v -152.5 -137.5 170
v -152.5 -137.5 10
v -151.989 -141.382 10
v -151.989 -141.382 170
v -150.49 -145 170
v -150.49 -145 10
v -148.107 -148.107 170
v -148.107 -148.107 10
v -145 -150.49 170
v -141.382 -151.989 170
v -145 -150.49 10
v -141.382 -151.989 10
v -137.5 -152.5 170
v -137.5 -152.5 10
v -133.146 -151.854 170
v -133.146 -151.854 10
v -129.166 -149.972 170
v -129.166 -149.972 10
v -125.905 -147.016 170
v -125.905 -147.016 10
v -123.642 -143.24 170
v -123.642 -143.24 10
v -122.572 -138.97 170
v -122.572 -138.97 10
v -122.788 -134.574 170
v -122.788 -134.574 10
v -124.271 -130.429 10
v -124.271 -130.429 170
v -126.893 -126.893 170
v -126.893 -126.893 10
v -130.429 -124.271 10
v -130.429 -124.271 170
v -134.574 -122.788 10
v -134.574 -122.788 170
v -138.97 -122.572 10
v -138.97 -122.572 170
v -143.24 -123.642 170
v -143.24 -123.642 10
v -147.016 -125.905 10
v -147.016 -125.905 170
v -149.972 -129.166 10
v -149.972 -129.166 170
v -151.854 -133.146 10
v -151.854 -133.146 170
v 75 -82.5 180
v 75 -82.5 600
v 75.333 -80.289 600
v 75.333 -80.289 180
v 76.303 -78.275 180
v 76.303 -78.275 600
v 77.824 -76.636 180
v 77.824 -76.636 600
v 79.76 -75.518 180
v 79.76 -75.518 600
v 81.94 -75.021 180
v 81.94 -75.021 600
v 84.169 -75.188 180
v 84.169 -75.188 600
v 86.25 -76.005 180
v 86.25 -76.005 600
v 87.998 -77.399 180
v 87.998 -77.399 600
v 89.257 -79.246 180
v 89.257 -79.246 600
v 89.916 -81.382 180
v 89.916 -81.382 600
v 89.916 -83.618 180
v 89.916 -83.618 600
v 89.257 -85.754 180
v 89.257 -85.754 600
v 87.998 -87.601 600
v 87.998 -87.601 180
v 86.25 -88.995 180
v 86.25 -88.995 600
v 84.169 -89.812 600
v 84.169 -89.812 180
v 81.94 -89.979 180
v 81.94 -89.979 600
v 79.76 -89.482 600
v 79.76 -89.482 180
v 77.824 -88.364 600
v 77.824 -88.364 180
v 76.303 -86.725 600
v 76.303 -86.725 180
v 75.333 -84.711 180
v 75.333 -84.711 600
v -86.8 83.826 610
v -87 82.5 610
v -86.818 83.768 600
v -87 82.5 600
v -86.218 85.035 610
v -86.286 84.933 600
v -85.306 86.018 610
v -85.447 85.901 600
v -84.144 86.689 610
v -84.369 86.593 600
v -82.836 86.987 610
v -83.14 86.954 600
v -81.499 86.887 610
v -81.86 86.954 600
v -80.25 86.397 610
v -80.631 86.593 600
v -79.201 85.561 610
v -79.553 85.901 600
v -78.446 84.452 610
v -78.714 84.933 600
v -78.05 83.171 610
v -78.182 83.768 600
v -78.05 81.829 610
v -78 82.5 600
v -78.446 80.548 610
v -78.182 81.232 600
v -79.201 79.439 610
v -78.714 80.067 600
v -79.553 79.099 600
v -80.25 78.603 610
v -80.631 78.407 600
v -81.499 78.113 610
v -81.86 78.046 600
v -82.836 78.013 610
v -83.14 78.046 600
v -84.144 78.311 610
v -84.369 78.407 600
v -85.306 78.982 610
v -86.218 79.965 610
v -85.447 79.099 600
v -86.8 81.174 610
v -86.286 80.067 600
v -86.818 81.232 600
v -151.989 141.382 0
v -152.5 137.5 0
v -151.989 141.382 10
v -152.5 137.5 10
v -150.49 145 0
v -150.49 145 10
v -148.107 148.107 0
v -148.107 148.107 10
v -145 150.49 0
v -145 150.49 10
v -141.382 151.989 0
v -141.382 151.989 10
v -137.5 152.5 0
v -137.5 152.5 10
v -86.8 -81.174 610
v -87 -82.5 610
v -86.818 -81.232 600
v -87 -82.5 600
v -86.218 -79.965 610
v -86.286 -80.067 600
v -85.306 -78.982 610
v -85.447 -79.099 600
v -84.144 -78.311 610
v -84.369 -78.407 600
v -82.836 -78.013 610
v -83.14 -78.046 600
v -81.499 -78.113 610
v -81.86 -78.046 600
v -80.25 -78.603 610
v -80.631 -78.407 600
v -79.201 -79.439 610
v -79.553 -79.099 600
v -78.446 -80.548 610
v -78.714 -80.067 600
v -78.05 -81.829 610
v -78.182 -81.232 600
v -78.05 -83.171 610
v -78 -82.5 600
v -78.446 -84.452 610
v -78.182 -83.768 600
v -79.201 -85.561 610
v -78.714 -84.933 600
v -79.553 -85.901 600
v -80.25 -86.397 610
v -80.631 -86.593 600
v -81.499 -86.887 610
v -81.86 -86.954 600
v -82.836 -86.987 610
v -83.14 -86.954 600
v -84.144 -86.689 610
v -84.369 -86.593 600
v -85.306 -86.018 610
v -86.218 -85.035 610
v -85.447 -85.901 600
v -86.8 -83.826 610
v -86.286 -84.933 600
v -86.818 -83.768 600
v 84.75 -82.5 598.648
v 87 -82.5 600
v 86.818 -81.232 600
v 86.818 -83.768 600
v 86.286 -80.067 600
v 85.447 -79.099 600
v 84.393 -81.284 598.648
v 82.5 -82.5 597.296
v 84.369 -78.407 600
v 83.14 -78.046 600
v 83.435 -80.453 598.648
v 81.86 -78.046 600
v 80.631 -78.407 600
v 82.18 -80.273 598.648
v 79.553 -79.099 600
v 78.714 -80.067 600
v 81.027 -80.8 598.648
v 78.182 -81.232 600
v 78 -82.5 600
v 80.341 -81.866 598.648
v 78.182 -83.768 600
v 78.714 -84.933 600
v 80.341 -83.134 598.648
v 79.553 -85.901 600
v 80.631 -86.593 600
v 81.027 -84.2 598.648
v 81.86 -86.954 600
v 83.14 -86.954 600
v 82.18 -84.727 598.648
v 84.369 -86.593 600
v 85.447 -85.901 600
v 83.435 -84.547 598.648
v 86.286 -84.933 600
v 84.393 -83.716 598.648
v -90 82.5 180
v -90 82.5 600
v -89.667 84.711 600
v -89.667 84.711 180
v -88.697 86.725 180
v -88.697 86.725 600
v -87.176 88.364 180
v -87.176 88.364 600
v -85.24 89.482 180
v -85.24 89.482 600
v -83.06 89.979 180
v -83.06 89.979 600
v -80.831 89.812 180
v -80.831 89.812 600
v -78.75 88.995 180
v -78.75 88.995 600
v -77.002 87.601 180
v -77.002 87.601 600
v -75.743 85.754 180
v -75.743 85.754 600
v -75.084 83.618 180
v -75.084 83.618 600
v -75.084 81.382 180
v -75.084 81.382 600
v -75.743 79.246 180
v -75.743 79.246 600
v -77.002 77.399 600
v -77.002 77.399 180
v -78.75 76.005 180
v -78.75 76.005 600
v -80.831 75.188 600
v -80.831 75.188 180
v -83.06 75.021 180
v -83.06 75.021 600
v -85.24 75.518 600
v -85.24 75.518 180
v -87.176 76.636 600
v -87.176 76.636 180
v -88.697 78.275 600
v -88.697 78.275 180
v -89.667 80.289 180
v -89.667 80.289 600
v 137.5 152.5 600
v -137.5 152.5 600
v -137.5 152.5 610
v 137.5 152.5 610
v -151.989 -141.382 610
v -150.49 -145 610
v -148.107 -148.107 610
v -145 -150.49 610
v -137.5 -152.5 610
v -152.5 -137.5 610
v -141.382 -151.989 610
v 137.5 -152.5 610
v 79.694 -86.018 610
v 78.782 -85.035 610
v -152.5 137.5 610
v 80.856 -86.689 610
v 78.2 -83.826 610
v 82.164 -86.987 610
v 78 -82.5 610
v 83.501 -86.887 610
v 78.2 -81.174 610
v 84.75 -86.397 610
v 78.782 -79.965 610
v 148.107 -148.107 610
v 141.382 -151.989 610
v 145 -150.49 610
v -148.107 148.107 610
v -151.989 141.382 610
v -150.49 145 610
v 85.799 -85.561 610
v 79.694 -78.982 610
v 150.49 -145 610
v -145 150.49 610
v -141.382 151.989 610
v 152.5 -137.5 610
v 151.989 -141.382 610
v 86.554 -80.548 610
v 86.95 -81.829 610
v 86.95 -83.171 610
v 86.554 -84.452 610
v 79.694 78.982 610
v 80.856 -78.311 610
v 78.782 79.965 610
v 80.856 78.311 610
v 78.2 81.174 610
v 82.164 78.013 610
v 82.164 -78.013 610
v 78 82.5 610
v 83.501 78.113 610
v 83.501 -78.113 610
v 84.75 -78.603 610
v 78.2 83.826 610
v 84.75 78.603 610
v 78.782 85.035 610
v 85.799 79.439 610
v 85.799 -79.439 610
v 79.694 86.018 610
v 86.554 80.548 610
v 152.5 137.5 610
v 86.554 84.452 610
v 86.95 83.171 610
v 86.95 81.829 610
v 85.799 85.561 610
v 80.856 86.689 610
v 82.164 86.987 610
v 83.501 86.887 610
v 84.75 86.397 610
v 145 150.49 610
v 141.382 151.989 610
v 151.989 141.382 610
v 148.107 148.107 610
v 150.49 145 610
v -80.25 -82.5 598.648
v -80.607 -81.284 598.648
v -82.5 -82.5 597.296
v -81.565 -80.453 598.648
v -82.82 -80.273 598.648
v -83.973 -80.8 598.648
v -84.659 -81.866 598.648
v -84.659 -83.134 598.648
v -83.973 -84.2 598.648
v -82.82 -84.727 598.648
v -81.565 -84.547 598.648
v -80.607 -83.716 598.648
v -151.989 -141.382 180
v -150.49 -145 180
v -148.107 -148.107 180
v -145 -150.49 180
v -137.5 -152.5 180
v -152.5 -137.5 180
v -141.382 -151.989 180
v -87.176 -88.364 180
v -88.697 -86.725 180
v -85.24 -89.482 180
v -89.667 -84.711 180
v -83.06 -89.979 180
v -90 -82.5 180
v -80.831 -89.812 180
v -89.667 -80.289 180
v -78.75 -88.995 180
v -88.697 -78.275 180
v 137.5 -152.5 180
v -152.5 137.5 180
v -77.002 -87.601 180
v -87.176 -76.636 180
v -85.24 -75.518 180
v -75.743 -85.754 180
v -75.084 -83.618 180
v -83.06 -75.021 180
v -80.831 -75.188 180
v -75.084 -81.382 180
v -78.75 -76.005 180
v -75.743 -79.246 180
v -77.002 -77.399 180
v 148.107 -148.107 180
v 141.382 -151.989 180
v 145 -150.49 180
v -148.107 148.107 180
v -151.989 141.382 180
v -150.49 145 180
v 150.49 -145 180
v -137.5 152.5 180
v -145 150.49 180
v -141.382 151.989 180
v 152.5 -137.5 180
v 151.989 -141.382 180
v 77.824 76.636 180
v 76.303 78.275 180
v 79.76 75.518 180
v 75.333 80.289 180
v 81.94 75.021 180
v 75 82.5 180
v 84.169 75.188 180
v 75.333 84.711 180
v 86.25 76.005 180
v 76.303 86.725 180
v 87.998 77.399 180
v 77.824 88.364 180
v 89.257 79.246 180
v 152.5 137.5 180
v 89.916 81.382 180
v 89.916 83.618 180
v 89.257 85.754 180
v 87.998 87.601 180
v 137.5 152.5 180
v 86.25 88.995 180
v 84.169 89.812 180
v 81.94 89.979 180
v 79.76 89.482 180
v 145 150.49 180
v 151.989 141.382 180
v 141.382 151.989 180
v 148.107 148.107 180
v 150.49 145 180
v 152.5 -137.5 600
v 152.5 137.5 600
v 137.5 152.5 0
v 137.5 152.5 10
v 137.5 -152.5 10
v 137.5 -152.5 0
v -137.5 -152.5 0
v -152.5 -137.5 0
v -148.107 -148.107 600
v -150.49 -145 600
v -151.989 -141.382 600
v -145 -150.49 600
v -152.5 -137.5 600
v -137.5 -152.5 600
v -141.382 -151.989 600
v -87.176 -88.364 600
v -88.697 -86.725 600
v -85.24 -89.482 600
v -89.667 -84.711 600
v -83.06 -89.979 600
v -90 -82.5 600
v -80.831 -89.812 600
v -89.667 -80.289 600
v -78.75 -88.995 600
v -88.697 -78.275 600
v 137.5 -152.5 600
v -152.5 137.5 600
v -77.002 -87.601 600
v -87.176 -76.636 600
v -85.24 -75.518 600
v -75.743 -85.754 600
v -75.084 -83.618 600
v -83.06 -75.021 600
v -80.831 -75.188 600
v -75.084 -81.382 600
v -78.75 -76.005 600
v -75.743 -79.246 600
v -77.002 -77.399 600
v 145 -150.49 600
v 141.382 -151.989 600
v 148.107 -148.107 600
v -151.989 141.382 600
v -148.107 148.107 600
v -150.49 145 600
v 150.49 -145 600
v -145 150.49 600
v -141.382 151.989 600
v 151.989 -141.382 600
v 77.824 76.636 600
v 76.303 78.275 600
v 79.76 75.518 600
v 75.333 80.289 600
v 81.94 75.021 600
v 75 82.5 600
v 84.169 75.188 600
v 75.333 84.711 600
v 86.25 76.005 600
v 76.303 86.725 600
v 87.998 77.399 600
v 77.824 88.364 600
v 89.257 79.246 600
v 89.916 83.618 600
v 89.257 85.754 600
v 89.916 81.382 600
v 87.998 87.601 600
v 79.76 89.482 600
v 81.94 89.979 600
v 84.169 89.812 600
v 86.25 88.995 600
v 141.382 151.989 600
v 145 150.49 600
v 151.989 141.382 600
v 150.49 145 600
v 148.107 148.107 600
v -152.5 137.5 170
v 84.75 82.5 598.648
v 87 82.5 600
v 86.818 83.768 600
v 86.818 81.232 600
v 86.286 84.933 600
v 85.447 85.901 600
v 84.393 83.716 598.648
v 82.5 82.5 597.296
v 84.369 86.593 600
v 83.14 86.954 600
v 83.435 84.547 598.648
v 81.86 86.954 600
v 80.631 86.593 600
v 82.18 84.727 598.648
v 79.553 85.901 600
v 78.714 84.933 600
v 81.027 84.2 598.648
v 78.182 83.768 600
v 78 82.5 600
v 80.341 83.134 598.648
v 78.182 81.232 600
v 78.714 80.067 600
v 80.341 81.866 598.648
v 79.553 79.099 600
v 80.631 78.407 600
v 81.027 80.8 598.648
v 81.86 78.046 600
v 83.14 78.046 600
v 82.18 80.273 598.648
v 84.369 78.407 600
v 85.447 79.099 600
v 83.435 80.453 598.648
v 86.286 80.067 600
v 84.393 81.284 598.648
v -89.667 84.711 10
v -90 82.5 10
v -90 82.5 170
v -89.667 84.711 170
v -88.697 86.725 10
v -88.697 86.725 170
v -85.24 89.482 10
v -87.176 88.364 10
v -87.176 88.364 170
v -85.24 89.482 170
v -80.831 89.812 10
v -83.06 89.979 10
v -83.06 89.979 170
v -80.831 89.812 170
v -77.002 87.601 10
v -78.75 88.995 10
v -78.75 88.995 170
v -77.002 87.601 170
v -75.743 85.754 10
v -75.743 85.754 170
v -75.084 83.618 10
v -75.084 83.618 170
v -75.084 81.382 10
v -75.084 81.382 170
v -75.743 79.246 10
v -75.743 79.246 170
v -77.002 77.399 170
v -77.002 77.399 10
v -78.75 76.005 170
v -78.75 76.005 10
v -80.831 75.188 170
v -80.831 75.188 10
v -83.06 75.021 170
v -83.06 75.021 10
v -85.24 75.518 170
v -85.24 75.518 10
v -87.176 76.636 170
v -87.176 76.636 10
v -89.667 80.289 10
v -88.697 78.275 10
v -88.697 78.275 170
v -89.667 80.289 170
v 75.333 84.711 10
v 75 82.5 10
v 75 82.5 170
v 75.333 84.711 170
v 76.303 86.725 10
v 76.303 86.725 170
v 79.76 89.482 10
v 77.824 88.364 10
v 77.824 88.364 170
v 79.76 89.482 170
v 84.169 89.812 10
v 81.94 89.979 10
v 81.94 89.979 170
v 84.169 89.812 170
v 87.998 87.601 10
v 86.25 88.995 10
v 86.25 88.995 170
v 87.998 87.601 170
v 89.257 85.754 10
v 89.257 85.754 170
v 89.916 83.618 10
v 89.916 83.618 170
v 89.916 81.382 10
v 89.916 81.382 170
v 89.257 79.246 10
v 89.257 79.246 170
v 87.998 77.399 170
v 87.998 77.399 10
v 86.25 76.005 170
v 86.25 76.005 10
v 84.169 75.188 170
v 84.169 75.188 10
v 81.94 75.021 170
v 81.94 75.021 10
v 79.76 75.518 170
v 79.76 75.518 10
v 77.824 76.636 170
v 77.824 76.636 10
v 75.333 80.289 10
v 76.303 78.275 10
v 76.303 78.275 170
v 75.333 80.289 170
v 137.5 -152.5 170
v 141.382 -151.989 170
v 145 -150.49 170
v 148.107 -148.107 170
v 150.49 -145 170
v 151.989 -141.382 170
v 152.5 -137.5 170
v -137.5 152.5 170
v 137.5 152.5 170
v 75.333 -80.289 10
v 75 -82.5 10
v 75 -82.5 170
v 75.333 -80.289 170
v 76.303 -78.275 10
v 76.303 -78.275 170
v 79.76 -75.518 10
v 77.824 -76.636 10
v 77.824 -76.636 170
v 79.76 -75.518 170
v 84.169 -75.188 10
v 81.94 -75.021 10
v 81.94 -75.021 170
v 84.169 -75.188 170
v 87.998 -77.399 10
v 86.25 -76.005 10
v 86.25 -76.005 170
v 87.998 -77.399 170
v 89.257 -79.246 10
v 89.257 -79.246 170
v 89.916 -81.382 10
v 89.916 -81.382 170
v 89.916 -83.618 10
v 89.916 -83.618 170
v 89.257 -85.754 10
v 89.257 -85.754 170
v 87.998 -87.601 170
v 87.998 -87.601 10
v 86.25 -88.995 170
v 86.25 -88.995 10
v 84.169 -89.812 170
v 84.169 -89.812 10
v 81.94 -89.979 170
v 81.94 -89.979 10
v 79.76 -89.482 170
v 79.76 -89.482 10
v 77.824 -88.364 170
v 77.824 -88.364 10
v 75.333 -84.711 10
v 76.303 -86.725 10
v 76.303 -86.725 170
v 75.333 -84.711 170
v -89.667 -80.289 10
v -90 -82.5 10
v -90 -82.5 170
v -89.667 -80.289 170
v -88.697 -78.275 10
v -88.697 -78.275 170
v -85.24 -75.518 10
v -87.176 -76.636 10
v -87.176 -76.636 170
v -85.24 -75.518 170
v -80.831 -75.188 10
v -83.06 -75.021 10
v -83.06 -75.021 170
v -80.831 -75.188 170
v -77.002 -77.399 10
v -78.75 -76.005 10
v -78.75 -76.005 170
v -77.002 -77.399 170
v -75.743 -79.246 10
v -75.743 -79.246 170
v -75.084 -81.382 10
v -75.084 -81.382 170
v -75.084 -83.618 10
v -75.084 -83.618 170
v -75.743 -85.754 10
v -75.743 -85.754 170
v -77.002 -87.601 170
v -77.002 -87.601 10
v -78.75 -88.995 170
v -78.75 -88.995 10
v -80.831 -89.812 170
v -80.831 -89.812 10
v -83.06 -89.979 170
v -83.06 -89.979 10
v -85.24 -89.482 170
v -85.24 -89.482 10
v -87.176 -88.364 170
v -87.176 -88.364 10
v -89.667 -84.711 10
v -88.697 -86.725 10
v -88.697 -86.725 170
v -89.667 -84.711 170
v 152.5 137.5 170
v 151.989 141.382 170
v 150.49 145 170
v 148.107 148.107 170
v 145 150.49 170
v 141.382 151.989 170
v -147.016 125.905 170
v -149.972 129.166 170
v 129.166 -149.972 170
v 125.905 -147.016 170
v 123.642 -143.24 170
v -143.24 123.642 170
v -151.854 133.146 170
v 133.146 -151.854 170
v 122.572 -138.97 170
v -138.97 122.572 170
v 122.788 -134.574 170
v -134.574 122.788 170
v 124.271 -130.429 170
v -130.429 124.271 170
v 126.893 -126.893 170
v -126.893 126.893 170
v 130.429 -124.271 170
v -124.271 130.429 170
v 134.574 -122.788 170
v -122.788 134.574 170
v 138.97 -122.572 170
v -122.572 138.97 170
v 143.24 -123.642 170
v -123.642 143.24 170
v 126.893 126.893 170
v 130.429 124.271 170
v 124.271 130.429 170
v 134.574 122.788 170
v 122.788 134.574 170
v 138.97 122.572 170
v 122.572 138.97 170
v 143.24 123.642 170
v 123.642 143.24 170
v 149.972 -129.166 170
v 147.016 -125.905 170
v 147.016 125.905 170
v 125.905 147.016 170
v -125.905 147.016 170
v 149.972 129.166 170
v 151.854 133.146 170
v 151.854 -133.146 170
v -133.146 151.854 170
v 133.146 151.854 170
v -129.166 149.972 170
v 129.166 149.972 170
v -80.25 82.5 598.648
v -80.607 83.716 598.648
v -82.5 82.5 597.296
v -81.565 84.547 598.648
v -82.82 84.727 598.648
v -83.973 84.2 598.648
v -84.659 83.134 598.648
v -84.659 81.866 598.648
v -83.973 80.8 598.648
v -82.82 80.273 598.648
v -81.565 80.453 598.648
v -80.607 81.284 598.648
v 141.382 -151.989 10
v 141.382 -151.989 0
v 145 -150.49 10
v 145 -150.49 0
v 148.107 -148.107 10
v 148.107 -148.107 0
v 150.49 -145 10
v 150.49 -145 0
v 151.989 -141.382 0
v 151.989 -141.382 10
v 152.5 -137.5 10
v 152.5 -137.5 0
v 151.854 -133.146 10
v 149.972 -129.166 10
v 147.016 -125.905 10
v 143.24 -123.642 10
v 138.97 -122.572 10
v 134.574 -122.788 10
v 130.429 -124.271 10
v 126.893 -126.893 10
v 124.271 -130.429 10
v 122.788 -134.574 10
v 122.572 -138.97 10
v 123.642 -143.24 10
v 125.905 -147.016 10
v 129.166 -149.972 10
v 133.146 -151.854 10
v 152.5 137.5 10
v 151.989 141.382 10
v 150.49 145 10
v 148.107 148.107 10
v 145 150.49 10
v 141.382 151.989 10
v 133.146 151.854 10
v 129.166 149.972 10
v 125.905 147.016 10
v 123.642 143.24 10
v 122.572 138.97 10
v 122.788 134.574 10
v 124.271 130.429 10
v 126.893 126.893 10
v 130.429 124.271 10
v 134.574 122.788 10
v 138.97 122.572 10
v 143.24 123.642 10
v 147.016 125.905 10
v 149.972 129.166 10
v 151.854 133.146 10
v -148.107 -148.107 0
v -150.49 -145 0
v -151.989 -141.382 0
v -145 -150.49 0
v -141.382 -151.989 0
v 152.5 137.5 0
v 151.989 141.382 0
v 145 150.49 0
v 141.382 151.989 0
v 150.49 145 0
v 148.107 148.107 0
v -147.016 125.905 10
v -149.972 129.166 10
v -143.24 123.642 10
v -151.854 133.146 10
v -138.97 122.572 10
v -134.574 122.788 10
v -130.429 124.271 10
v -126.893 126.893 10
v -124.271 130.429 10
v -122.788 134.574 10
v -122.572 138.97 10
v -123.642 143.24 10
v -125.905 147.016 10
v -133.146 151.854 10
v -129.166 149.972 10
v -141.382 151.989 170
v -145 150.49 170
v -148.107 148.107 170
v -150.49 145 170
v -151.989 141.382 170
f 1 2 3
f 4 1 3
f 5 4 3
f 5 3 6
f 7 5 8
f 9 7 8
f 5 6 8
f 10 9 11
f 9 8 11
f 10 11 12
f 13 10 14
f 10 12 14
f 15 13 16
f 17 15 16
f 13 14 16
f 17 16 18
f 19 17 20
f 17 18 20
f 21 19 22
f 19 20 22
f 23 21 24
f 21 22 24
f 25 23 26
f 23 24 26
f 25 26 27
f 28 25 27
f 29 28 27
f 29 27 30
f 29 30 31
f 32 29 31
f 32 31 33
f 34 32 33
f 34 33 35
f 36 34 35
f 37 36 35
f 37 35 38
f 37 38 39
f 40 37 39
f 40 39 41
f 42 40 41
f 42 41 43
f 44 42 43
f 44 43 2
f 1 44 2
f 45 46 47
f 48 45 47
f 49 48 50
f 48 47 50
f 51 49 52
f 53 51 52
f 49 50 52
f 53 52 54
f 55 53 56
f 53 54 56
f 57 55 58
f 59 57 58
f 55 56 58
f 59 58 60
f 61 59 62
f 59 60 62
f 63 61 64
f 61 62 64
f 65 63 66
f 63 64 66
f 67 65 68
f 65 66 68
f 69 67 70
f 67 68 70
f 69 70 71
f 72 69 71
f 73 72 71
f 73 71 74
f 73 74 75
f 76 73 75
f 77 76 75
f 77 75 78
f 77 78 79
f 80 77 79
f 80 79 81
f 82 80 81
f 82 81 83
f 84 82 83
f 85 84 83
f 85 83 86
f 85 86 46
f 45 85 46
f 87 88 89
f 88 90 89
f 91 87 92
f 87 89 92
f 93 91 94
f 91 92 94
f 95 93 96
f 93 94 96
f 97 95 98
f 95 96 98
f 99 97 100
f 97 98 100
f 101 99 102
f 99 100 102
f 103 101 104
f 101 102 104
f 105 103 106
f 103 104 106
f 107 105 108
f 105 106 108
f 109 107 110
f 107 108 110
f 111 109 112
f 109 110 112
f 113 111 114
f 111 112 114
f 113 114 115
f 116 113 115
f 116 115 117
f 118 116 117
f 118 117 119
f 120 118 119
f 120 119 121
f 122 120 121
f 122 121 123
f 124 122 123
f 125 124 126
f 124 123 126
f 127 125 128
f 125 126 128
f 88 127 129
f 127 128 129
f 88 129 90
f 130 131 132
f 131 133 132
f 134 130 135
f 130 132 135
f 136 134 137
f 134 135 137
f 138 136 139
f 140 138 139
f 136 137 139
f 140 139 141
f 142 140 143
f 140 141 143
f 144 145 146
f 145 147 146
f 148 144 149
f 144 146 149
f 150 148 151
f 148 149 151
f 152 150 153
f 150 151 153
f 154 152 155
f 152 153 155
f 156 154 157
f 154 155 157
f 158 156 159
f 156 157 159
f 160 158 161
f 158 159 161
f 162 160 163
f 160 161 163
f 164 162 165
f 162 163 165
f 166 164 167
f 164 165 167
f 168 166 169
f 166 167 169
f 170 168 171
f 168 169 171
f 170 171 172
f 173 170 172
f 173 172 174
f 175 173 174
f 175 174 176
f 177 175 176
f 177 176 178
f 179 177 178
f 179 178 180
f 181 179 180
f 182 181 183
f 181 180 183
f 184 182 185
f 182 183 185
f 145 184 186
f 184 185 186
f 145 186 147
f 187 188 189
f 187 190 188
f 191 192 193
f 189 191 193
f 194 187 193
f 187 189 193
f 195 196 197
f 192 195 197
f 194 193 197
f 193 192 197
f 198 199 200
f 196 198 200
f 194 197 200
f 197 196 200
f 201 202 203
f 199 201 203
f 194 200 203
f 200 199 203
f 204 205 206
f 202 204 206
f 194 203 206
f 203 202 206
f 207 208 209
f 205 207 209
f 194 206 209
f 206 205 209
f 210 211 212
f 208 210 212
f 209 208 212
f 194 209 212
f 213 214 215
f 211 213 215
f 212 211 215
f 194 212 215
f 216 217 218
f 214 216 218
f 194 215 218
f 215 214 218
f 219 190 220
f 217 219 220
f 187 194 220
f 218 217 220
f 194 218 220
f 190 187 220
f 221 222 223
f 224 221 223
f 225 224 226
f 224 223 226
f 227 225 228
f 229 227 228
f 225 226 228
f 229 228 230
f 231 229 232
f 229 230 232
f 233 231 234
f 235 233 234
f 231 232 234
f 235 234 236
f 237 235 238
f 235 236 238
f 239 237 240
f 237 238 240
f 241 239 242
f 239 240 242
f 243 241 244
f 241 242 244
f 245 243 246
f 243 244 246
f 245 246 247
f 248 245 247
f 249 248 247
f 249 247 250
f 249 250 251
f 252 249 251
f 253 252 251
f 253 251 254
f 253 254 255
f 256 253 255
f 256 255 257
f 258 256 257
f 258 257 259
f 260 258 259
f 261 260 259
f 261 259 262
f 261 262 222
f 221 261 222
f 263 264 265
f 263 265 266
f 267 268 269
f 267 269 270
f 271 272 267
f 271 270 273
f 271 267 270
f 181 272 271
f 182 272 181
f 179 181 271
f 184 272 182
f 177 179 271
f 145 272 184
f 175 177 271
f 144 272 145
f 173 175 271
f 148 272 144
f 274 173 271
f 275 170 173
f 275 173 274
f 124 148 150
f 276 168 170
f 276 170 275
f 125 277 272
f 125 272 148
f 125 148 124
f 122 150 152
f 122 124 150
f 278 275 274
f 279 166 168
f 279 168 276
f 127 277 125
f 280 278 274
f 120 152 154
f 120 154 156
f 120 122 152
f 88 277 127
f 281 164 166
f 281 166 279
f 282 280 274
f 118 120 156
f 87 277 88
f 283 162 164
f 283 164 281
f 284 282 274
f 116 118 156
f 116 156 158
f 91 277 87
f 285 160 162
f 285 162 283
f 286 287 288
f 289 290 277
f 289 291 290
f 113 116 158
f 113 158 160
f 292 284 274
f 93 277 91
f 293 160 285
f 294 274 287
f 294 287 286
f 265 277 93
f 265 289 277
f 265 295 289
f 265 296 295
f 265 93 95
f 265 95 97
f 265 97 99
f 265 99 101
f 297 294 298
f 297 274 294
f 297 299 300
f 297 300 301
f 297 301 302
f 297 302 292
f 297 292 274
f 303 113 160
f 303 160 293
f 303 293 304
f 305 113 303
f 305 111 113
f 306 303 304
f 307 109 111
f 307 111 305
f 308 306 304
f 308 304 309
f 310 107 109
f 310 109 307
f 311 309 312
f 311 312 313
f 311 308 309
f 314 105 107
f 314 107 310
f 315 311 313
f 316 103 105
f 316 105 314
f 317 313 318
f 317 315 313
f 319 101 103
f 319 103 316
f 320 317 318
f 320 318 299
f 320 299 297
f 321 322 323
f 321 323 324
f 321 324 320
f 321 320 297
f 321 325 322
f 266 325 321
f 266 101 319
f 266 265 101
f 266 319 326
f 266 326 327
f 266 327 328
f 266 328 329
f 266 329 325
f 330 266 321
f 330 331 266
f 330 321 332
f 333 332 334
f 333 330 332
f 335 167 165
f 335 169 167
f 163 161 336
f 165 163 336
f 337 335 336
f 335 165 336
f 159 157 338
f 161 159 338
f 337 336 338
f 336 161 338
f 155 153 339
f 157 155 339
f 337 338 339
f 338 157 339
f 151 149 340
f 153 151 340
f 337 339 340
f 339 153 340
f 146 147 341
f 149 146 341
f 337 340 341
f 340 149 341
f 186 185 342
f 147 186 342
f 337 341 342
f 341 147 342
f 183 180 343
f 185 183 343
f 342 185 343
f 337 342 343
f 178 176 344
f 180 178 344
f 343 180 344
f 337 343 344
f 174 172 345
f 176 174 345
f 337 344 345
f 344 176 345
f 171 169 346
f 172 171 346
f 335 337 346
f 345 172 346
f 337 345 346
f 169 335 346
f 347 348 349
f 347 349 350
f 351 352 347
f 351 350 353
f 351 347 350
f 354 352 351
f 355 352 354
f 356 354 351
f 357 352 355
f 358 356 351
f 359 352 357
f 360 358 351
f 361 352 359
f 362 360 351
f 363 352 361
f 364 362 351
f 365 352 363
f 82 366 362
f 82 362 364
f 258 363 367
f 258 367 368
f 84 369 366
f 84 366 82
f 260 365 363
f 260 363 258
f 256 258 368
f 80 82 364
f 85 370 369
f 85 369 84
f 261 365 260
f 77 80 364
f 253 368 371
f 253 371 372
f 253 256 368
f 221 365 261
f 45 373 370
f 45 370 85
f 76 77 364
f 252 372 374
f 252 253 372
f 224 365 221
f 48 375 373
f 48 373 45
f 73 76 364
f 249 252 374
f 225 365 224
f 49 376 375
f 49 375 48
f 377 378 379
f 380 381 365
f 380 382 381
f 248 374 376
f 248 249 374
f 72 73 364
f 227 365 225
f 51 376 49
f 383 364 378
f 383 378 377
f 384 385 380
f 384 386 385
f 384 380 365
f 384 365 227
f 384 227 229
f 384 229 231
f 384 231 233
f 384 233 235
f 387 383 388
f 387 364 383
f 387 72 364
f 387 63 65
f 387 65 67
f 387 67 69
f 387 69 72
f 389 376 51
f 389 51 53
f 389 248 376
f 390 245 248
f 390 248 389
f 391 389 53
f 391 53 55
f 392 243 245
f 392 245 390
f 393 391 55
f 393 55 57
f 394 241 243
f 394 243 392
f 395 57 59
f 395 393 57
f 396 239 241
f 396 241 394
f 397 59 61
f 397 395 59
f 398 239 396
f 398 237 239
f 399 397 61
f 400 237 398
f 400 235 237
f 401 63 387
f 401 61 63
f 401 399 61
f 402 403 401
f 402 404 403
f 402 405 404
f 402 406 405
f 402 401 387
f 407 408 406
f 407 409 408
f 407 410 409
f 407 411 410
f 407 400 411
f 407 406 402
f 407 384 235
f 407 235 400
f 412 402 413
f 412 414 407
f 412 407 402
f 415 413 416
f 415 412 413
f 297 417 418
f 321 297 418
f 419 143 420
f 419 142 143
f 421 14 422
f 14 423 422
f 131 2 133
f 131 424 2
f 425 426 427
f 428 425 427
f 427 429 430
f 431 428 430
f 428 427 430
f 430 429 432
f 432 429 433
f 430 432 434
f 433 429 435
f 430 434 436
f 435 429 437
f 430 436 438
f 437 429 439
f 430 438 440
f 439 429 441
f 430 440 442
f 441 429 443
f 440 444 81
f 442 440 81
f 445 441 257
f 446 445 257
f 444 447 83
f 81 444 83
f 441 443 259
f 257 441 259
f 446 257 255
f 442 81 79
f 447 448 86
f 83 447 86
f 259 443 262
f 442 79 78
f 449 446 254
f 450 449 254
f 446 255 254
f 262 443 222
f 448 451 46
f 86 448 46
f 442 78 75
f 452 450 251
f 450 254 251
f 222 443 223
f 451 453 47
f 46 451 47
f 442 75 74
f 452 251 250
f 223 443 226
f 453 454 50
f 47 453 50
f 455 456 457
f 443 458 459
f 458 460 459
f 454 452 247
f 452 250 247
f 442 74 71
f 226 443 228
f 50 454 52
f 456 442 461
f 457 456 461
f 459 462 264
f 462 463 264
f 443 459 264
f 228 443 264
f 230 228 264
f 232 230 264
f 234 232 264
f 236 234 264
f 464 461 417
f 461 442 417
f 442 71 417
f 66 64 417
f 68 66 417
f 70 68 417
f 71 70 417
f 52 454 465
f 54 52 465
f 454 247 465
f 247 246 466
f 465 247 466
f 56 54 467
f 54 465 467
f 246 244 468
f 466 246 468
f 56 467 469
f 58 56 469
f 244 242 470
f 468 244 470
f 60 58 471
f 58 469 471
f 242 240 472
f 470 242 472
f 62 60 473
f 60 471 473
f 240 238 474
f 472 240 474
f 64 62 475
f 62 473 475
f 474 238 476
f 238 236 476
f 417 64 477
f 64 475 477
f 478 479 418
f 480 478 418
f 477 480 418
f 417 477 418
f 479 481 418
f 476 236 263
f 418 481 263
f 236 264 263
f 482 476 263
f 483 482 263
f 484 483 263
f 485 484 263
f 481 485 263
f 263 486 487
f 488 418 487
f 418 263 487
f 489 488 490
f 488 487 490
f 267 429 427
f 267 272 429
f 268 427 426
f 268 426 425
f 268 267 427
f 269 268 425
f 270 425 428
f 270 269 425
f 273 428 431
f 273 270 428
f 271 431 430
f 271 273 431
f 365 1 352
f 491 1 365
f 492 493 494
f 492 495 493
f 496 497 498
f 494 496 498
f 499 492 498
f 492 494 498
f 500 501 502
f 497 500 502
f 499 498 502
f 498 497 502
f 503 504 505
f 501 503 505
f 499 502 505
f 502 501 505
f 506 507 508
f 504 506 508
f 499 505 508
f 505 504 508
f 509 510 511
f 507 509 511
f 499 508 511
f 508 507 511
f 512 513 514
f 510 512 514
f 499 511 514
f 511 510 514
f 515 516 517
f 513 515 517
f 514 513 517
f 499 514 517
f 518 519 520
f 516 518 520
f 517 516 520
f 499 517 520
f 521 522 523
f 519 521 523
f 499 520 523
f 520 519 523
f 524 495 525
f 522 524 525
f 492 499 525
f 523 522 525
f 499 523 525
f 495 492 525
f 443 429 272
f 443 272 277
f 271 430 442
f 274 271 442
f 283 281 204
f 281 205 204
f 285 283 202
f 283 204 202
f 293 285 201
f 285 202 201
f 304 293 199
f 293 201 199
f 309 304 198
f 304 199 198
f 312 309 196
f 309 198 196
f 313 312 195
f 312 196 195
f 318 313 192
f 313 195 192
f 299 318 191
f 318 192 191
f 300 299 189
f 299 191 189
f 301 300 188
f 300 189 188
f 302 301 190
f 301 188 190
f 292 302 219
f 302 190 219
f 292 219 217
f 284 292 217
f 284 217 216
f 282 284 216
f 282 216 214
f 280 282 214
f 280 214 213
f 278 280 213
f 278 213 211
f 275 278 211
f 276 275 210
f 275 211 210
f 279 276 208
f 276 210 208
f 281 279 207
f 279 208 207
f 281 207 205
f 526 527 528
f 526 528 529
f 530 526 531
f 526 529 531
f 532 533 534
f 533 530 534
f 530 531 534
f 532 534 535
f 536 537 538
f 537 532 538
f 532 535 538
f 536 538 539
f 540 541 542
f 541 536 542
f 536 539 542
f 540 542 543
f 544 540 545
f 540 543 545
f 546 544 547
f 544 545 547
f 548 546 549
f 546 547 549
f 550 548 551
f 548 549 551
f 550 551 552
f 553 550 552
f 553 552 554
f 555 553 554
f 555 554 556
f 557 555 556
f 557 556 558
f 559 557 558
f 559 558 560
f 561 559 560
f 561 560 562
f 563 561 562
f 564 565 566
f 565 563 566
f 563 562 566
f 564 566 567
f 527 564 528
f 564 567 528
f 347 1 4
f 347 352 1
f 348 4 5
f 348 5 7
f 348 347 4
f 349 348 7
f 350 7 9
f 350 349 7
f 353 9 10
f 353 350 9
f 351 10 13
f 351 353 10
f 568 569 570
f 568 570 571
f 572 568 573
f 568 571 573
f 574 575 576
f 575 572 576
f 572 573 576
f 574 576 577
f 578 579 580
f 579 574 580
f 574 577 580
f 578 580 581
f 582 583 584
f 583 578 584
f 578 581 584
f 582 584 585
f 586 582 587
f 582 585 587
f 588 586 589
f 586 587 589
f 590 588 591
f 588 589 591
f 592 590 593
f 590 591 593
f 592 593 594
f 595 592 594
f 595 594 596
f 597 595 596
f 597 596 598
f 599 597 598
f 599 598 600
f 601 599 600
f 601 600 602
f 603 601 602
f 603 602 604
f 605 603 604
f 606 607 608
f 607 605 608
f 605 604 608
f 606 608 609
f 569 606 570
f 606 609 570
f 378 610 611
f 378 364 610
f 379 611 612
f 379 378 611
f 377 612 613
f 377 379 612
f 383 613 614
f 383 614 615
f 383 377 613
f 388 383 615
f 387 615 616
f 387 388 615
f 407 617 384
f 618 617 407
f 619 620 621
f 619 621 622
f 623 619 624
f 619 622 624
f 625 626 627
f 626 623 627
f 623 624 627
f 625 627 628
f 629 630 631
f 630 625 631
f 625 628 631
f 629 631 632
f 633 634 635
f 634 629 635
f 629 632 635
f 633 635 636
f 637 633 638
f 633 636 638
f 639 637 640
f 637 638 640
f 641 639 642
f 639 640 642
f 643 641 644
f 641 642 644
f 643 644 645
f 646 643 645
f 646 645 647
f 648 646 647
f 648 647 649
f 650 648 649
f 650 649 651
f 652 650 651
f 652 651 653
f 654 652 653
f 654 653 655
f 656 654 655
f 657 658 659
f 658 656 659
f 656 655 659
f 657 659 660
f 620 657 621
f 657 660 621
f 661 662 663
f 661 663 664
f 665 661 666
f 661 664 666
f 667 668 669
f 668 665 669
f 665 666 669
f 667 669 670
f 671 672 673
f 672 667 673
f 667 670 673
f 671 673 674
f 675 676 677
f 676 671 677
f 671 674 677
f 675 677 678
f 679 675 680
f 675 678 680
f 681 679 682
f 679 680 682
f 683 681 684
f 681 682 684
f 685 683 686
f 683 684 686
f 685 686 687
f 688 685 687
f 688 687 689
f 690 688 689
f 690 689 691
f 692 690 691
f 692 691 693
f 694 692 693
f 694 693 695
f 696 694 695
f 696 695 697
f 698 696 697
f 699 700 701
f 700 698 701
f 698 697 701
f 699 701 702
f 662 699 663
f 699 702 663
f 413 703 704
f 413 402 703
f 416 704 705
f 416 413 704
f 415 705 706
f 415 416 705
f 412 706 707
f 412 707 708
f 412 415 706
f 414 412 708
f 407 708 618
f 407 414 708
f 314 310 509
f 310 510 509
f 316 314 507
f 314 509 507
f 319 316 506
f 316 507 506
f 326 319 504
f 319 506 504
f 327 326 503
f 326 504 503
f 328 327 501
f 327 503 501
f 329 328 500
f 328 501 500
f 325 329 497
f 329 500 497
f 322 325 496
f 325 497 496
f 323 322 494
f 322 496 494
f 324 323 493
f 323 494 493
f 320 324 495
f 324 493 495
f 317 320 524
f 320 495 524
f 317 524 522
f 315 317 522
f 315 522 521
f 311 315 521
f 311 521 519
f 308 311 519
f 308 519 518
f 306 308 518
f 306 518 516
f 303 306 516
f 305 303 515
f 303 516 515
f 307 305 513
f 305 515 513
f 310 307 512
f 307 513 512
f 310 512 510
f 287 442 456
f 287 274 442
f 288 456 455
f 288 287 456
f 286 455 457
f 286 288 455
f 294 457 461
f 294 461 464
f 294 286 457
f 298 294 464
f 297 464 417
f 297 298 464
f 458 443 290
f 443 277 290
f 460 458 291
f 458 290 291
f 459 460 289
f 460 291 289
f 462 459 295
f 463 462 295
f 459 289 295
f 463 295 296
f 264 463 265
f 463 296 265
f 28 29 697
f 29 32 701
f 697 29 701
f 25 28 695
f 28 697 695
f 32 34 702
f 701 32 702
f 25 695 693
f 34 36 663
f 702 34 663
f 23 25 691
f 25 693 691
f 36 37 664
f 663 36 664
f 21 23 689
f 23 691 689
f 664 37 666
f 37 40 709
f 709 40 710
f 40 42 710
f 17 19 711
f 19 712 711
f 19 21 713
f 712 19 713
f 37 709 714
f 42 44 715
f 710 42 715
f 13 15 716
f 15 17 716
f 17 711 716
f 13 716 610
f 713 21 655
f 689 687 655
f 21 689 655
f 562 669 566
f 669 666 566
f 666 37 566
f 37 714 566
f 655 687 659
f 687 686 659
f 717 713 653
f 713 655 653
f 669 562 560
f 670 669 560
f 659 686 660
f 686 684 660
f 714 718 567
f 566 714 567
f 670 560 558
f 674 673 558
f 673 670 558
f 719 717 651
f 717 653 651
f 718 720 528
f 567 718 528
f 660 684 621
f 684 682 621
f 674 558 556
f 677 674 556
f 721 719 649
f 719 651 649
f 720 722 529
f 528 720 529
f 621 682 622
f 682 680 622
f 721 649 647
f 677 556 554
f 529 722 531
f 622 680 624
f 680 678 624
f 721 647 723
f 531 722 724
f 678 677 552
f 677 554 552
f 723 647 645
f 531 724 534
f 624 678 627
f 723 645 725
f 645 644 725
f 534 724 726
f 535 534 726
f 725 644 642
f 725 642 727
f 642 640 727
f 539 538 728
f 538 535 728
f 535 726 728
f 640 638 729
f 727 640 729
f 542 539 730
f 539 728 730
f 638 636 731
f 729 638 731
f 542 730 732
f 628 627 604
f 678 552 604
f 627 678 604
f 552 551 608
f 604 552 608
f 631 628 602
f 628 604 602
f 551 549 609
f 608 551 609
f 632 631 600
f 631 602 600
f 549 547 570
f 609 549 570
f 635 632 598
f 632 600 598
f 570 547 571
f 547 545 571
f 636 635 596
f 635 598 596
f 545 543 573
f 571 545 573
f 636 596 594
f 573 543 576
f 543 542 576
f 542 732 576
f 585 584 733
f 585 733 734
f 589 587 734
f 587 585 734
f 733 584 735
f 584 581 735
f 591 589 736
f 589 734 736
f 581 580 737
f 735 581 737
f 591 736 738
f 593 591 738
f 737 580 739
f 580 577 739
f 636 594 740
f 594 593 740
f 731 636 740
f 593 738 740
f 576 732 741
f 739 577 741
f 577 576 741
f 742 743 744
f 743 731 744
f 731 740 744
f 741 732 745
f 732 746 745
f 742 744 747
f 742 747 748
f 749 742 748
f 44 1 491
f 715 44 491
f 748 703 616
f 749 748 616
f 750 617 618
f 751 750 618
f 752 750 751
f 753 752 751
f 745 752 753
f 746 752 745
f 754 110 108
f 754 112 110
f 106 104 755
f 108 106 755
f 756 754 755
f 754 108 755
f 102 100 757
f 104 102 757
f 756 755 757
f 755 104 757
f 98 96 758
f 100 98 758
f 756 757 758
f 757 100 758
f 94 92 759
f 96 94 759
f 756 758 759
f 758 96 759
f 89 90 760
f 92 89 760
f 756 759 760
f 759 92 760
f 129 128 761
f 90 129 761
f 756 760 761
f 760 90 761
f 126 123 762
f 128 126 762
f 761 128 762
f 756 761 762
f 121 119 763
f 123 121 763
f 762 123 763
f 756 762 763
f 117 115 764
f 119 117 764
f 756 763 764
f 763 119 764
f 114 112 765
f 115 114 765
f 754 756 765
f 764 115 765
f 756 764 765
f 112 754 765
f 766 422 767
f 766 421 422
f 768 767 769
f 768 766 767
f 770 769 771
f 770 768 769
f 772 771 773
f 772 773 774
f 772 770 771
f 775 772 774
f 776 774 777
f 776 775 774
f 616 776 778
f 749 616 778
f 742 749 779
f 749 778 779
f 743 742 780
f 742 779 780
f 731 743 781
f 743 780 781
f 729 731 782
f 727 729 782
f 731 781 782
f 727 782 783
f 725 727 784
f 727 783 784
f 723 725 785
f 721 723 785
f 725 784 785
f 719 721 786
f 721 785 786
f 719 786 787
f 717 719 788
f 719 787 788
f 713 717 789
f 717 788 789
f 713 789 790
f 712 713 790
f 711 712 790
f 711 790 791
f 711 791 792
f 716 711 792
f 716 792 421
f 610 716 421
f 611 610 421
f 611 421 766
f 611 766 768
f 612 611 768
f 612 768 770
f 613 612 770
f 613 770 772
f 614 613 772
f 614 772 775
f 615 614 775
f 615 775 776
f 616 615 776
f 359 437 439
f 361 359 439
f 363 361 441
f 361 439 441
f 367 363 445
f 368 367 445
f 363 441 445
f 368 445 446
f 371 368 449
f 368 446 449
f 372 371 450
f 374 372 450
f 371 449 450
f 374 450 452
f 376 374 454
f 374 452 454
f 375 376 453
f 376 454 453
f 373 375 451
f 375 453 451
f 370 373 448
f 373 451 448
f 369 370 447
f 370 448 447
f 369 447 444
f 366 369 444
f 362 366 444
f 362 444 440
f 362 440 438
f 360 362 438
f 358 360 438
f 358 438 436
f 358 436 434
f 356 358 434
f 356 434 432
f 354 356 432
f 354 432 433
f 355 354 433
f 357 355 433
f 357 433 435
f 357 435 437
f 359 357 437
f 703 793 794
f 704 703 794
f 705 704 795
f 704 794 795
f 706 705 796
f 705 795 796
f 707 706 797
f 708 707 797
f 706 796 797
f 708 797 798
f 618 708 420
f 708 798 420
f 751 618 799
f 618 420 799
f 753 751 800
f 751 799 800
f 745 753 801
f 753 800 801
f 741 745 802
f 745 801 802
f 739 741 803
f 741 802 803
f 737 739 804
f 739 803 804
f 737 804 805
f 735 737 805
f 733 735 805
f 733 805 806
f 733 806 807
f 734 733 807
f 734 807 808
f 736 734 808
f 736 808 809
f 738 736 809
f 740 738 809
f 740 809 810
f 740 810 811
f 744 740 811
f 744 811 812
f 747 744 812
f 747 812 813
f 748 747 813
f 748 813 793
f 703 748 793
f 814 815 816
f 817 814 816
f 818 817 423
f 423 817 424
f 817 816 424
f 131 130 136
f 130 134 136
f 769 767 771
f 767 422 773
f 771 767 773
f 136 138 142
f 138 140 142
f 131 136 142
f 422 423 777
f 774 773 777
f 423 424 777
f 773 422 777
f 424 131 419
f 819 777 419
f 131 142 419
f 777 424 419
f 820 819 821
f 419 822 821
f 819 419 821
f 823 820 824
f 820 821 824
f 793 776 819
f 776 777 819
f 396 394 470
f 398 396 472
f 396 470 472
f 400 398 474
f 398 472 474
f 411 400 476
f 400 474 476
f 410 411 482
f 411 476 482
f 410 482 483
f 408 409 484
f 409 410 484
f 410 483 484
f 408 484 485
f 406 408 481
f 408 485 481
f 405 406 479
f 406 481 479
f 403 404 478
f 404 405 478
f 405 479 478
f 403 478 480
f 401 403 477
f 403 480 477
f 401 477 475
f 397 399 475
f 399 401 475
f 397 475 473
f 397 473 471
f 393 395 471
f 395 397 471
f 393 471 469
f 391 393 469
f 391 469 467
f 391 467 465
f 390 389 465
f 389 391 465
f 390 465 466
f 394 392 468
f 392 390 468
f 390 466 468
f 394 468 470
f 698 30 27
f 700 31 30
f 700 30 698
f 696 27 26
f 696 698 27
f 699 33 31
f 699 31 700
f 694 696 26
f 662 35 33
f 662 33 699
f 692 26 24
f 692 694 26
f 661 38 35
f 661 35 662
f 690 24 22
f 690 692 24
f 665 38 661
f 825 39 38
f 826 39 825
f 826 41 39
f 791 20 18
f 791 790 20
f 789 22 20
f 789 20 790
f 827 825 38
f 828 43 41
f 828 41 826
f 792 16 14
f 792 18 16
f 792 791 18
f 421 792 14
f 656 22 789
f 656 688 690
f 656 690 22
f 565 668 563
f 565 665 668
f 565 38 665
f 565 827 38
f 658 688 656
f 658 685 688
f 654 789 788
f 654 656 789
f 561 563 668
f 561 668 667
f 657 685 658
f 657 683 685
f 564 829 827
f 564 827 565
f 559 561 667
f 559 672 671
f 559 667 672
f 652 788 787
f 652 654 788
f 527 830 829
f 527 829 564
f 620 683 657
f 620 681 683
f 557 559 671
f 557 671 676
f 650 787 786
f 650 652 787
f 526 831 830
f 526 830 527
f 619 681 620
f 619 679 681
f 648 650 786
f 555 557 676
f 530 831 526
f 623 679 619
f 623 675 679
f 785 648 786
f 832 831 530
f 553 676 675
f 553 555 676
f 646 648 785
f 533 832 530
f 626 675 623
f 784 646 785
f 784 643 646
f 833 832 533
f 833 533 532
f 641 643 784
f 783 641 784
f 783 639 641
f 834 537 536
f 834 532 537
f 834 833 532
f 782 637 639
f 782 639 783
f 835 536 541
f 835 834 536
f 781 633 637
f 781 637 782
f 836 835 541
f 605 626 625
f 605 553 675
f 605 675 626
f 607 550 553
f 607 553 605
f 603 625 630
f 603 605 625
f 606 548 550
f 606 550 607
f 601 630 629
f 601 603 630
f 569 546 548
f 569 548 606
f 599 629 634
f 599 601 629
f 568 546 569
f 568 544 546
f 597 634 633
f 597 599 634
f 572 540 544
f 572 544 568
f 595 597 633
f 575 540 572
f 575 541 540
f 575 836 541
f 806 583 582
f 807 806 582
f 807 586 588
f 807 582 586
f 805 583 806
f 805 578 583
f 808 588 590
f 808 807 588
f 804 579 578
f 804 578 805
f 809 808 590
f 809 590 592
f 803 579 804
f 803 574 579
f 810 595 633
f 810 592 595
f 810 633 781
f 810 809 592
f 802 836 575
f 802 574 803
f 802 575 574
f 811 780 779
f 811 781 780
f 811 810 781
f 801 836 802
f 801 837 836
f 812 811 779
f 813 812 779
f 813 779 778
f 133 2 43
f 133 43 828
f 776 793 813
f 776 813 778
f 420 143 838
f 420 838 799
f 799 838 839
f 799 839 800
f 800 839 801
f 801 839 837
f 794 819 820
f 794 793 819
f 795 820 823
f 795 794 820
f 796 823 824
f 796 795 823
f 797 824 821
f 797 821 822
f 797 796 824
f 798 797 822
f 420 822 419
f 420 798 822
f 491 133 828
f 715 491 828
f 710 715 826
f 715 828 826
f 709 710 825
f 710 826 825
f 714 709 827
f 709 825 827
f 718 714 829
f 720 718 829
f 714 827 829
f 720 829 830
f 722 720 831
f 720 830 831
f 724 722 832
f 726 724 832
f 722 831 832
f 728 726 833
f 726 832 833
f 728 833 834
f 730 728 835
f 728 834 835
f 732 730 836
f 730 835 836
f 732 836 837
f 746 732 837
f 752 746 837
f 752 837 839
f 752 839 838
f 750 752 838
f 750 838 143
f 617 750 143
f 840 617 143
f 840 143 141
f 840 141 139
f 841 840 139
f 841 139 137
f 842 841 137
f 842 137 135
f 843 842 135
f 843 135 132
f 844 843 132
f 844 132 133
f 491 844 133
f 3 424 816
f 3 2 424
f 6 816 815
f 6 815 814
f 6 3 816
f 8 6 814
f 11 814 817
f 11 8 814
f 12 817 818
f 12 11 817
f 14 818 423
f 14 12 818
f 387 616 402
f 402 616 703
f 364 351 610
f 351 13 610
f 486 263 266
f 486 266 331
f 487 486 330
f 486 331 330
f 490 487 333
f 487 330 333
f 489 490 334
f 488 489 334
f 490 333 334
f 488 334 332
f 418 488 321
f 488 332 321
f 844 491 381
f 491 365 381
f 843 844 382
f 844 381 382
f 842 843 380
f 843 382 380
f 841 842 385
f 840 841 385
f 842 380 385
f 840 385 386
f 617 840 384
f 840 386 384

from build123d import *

# Parameters (mm, degrees)
ESQUISSE1_W             = 305
ESQUISSE1_H             = 305
BOSS_EXTRU_1_DEPTH      = 10
ESQUISSE2_R             = 15
BOSS_EXTRU_2_DEPTH      = 160
ESQUISSE3_W             = 305
ESQUISSE3_H             = 305
BOSS_EXTRU_3_DEPTH      = 10
ESQUISSE4_R             = 7.5
ENL_V_MAT_EXTRU_1_DEPTH = 281.913687812
BOSS_EXTRU_4_START      = -600
ESQUISSE5_R             = 7.5
BOSS_EXTRU_4_DEPTH      = 600
ESQUISSE7_W             = 305
ESQUISSE7_H             = 305
BOSS_EXTRU_5_DEPTH      = 10
D_GAGEMENT_M81_D        = 9
D_GAGEMENT_M81_DEPTH    = 10
D_GAGEMENT_M81_TIP      = 2.703872786
CONG_1_R                = 15


with BuildPart() as part:
    # Esquisse1 → Boss.-Extru.1 (new body)
    with BuildSketch(Plane.XY):
        Rectangle(ESQUISSE1_W, ESQUISSE1_H)
    extrude(amount=BOSS_EXTRU_1_DEPTH)

    # Esquisse2 → Boss.-Extru.2 (add)
    with BuildSketch(Plane.XY.offset(10)):
        with Locations((137.5, 137.5)):
            Circle(ESQUISSE2_R)
        with Locations((137.5, -137.5)):
            Circle(ESQUISSE2_R)
        with Locations(Location((-137.5, -137.5, 0), (0, 0, 180))):
            Circle(ESQUISSE2_R)
        with Locations(Location((-137.5, 137.5, 0), (0, 0, 180))):
            Circle(ESQUISSE2_R)
    extrude(amount=BOSS_EXTRU_2_DEPTH)

    # Esquisse3 → Boss.-Extru.3 (add)
    with BuildSketch(Plane.XY.offset(170)):
        Rectangle(ESQUISSE3_W, ESQUISSE3_H)
    extrude(amount=BOSS_EXTRU_3_DEPTH)

    # Esquisse4 → Enlèv. mat.-Extru.1 (cut, through all)
    with BuildSketch(Plane.XY.offset(180)):
        with Locations((82.5, -82.5)):
            Circle(ESQUISSE4_R)
        with Locations((-82.5, -82.5)):
            Circle(ESQUISSE4_R)
        with Locations((82.5, 82.5)):
            Circle(ESQUISSE4_R)
        with Locations((-82.5, 82.5)):
            Circle(ESQUISSE4_R)
    extrude(amount=-ENL_V_MAT_EXTRU_1_DEPTH, mode=Mode.SUBTRACT)

    # Esquisse5 → Boss.-Extru.4 (add)
    with BuildSketch(Plane(origin=(0, 0, 0), x_dir=(-1, 0, 0), z_dir=(0, 0, -1)).offset(BOSS_EXTRU_4_START)):
        with Locations((-82.5, 82.5)):
            Circle(ESQUISSE5_R)
        with Locations((82.5, 82.5)):
            Circle(ESQUISSE5_R)
        with Locations((82.5, -82.5)):
            Circle(ESQUISSE5_R)
        with Locations((-82.5, -82.5)):
            Circle(ESQUISSE5_R)
    extrude(amount=BOSS_EXTRU_4_DEPTH)

    # Esquisse7 → Boss.-Extru.5 (add)
    with BuildSketch(Plane.XY.offset(600)):
        Rectangle(ESQUISSE7_W, ESQUISSE7_H)
    extrude(amount=BOSS_EXTRU_5_DEPTH)

    # Dégagement M81
    with Locations(Plane(origin=(82.5, -82.5, 610), x_dir=(1, 0, 0), z_dir=(0, 0, 1))):
        with Locations((0, 0), (0, 165), (-165, 165), (-165, 0)):
            Hole(D_GAGEMENT_M81_D / 2, depth=D_GAGEMENT_M81_DEPTH)
            with Locations((0, 0, -(D_GAGEMENT_M81_DEPTH + D_GAGEMENT_M81_TIP / 2))):  # 118° drill point
                Cone(0, D_GAGEMENT_M81_D / 2, D_GAGEMENT_M81_TIP, mode=Mode.SUBTRACT)

    # Congé1
    cong_1_edges = [part.edges().sort_by_distance(p)[0] for p in [
        (-152.5, 152.5, 605),
        (-152.5, 152.5, 175),
        (-152.5, 152.5, 5),
        (-152.5, -152.5, 5),
        (-152.5, -152.5, 175),
        (-152.5, -152.5, 605),
        (152.5, -152.5, 605),
        (152.5, -152.5, 175),
        (152.5, -152.5, 5),
        (152.5, 152.5, 5),
        (152.5, 152.5, 175),
        (152.5, 152.5, 605),
    ]]
    fillet(cong_1_edges, radius=CONG_1_R - 0.0001)  # a hair under: the kernel refuses the full size


solid = part.part
